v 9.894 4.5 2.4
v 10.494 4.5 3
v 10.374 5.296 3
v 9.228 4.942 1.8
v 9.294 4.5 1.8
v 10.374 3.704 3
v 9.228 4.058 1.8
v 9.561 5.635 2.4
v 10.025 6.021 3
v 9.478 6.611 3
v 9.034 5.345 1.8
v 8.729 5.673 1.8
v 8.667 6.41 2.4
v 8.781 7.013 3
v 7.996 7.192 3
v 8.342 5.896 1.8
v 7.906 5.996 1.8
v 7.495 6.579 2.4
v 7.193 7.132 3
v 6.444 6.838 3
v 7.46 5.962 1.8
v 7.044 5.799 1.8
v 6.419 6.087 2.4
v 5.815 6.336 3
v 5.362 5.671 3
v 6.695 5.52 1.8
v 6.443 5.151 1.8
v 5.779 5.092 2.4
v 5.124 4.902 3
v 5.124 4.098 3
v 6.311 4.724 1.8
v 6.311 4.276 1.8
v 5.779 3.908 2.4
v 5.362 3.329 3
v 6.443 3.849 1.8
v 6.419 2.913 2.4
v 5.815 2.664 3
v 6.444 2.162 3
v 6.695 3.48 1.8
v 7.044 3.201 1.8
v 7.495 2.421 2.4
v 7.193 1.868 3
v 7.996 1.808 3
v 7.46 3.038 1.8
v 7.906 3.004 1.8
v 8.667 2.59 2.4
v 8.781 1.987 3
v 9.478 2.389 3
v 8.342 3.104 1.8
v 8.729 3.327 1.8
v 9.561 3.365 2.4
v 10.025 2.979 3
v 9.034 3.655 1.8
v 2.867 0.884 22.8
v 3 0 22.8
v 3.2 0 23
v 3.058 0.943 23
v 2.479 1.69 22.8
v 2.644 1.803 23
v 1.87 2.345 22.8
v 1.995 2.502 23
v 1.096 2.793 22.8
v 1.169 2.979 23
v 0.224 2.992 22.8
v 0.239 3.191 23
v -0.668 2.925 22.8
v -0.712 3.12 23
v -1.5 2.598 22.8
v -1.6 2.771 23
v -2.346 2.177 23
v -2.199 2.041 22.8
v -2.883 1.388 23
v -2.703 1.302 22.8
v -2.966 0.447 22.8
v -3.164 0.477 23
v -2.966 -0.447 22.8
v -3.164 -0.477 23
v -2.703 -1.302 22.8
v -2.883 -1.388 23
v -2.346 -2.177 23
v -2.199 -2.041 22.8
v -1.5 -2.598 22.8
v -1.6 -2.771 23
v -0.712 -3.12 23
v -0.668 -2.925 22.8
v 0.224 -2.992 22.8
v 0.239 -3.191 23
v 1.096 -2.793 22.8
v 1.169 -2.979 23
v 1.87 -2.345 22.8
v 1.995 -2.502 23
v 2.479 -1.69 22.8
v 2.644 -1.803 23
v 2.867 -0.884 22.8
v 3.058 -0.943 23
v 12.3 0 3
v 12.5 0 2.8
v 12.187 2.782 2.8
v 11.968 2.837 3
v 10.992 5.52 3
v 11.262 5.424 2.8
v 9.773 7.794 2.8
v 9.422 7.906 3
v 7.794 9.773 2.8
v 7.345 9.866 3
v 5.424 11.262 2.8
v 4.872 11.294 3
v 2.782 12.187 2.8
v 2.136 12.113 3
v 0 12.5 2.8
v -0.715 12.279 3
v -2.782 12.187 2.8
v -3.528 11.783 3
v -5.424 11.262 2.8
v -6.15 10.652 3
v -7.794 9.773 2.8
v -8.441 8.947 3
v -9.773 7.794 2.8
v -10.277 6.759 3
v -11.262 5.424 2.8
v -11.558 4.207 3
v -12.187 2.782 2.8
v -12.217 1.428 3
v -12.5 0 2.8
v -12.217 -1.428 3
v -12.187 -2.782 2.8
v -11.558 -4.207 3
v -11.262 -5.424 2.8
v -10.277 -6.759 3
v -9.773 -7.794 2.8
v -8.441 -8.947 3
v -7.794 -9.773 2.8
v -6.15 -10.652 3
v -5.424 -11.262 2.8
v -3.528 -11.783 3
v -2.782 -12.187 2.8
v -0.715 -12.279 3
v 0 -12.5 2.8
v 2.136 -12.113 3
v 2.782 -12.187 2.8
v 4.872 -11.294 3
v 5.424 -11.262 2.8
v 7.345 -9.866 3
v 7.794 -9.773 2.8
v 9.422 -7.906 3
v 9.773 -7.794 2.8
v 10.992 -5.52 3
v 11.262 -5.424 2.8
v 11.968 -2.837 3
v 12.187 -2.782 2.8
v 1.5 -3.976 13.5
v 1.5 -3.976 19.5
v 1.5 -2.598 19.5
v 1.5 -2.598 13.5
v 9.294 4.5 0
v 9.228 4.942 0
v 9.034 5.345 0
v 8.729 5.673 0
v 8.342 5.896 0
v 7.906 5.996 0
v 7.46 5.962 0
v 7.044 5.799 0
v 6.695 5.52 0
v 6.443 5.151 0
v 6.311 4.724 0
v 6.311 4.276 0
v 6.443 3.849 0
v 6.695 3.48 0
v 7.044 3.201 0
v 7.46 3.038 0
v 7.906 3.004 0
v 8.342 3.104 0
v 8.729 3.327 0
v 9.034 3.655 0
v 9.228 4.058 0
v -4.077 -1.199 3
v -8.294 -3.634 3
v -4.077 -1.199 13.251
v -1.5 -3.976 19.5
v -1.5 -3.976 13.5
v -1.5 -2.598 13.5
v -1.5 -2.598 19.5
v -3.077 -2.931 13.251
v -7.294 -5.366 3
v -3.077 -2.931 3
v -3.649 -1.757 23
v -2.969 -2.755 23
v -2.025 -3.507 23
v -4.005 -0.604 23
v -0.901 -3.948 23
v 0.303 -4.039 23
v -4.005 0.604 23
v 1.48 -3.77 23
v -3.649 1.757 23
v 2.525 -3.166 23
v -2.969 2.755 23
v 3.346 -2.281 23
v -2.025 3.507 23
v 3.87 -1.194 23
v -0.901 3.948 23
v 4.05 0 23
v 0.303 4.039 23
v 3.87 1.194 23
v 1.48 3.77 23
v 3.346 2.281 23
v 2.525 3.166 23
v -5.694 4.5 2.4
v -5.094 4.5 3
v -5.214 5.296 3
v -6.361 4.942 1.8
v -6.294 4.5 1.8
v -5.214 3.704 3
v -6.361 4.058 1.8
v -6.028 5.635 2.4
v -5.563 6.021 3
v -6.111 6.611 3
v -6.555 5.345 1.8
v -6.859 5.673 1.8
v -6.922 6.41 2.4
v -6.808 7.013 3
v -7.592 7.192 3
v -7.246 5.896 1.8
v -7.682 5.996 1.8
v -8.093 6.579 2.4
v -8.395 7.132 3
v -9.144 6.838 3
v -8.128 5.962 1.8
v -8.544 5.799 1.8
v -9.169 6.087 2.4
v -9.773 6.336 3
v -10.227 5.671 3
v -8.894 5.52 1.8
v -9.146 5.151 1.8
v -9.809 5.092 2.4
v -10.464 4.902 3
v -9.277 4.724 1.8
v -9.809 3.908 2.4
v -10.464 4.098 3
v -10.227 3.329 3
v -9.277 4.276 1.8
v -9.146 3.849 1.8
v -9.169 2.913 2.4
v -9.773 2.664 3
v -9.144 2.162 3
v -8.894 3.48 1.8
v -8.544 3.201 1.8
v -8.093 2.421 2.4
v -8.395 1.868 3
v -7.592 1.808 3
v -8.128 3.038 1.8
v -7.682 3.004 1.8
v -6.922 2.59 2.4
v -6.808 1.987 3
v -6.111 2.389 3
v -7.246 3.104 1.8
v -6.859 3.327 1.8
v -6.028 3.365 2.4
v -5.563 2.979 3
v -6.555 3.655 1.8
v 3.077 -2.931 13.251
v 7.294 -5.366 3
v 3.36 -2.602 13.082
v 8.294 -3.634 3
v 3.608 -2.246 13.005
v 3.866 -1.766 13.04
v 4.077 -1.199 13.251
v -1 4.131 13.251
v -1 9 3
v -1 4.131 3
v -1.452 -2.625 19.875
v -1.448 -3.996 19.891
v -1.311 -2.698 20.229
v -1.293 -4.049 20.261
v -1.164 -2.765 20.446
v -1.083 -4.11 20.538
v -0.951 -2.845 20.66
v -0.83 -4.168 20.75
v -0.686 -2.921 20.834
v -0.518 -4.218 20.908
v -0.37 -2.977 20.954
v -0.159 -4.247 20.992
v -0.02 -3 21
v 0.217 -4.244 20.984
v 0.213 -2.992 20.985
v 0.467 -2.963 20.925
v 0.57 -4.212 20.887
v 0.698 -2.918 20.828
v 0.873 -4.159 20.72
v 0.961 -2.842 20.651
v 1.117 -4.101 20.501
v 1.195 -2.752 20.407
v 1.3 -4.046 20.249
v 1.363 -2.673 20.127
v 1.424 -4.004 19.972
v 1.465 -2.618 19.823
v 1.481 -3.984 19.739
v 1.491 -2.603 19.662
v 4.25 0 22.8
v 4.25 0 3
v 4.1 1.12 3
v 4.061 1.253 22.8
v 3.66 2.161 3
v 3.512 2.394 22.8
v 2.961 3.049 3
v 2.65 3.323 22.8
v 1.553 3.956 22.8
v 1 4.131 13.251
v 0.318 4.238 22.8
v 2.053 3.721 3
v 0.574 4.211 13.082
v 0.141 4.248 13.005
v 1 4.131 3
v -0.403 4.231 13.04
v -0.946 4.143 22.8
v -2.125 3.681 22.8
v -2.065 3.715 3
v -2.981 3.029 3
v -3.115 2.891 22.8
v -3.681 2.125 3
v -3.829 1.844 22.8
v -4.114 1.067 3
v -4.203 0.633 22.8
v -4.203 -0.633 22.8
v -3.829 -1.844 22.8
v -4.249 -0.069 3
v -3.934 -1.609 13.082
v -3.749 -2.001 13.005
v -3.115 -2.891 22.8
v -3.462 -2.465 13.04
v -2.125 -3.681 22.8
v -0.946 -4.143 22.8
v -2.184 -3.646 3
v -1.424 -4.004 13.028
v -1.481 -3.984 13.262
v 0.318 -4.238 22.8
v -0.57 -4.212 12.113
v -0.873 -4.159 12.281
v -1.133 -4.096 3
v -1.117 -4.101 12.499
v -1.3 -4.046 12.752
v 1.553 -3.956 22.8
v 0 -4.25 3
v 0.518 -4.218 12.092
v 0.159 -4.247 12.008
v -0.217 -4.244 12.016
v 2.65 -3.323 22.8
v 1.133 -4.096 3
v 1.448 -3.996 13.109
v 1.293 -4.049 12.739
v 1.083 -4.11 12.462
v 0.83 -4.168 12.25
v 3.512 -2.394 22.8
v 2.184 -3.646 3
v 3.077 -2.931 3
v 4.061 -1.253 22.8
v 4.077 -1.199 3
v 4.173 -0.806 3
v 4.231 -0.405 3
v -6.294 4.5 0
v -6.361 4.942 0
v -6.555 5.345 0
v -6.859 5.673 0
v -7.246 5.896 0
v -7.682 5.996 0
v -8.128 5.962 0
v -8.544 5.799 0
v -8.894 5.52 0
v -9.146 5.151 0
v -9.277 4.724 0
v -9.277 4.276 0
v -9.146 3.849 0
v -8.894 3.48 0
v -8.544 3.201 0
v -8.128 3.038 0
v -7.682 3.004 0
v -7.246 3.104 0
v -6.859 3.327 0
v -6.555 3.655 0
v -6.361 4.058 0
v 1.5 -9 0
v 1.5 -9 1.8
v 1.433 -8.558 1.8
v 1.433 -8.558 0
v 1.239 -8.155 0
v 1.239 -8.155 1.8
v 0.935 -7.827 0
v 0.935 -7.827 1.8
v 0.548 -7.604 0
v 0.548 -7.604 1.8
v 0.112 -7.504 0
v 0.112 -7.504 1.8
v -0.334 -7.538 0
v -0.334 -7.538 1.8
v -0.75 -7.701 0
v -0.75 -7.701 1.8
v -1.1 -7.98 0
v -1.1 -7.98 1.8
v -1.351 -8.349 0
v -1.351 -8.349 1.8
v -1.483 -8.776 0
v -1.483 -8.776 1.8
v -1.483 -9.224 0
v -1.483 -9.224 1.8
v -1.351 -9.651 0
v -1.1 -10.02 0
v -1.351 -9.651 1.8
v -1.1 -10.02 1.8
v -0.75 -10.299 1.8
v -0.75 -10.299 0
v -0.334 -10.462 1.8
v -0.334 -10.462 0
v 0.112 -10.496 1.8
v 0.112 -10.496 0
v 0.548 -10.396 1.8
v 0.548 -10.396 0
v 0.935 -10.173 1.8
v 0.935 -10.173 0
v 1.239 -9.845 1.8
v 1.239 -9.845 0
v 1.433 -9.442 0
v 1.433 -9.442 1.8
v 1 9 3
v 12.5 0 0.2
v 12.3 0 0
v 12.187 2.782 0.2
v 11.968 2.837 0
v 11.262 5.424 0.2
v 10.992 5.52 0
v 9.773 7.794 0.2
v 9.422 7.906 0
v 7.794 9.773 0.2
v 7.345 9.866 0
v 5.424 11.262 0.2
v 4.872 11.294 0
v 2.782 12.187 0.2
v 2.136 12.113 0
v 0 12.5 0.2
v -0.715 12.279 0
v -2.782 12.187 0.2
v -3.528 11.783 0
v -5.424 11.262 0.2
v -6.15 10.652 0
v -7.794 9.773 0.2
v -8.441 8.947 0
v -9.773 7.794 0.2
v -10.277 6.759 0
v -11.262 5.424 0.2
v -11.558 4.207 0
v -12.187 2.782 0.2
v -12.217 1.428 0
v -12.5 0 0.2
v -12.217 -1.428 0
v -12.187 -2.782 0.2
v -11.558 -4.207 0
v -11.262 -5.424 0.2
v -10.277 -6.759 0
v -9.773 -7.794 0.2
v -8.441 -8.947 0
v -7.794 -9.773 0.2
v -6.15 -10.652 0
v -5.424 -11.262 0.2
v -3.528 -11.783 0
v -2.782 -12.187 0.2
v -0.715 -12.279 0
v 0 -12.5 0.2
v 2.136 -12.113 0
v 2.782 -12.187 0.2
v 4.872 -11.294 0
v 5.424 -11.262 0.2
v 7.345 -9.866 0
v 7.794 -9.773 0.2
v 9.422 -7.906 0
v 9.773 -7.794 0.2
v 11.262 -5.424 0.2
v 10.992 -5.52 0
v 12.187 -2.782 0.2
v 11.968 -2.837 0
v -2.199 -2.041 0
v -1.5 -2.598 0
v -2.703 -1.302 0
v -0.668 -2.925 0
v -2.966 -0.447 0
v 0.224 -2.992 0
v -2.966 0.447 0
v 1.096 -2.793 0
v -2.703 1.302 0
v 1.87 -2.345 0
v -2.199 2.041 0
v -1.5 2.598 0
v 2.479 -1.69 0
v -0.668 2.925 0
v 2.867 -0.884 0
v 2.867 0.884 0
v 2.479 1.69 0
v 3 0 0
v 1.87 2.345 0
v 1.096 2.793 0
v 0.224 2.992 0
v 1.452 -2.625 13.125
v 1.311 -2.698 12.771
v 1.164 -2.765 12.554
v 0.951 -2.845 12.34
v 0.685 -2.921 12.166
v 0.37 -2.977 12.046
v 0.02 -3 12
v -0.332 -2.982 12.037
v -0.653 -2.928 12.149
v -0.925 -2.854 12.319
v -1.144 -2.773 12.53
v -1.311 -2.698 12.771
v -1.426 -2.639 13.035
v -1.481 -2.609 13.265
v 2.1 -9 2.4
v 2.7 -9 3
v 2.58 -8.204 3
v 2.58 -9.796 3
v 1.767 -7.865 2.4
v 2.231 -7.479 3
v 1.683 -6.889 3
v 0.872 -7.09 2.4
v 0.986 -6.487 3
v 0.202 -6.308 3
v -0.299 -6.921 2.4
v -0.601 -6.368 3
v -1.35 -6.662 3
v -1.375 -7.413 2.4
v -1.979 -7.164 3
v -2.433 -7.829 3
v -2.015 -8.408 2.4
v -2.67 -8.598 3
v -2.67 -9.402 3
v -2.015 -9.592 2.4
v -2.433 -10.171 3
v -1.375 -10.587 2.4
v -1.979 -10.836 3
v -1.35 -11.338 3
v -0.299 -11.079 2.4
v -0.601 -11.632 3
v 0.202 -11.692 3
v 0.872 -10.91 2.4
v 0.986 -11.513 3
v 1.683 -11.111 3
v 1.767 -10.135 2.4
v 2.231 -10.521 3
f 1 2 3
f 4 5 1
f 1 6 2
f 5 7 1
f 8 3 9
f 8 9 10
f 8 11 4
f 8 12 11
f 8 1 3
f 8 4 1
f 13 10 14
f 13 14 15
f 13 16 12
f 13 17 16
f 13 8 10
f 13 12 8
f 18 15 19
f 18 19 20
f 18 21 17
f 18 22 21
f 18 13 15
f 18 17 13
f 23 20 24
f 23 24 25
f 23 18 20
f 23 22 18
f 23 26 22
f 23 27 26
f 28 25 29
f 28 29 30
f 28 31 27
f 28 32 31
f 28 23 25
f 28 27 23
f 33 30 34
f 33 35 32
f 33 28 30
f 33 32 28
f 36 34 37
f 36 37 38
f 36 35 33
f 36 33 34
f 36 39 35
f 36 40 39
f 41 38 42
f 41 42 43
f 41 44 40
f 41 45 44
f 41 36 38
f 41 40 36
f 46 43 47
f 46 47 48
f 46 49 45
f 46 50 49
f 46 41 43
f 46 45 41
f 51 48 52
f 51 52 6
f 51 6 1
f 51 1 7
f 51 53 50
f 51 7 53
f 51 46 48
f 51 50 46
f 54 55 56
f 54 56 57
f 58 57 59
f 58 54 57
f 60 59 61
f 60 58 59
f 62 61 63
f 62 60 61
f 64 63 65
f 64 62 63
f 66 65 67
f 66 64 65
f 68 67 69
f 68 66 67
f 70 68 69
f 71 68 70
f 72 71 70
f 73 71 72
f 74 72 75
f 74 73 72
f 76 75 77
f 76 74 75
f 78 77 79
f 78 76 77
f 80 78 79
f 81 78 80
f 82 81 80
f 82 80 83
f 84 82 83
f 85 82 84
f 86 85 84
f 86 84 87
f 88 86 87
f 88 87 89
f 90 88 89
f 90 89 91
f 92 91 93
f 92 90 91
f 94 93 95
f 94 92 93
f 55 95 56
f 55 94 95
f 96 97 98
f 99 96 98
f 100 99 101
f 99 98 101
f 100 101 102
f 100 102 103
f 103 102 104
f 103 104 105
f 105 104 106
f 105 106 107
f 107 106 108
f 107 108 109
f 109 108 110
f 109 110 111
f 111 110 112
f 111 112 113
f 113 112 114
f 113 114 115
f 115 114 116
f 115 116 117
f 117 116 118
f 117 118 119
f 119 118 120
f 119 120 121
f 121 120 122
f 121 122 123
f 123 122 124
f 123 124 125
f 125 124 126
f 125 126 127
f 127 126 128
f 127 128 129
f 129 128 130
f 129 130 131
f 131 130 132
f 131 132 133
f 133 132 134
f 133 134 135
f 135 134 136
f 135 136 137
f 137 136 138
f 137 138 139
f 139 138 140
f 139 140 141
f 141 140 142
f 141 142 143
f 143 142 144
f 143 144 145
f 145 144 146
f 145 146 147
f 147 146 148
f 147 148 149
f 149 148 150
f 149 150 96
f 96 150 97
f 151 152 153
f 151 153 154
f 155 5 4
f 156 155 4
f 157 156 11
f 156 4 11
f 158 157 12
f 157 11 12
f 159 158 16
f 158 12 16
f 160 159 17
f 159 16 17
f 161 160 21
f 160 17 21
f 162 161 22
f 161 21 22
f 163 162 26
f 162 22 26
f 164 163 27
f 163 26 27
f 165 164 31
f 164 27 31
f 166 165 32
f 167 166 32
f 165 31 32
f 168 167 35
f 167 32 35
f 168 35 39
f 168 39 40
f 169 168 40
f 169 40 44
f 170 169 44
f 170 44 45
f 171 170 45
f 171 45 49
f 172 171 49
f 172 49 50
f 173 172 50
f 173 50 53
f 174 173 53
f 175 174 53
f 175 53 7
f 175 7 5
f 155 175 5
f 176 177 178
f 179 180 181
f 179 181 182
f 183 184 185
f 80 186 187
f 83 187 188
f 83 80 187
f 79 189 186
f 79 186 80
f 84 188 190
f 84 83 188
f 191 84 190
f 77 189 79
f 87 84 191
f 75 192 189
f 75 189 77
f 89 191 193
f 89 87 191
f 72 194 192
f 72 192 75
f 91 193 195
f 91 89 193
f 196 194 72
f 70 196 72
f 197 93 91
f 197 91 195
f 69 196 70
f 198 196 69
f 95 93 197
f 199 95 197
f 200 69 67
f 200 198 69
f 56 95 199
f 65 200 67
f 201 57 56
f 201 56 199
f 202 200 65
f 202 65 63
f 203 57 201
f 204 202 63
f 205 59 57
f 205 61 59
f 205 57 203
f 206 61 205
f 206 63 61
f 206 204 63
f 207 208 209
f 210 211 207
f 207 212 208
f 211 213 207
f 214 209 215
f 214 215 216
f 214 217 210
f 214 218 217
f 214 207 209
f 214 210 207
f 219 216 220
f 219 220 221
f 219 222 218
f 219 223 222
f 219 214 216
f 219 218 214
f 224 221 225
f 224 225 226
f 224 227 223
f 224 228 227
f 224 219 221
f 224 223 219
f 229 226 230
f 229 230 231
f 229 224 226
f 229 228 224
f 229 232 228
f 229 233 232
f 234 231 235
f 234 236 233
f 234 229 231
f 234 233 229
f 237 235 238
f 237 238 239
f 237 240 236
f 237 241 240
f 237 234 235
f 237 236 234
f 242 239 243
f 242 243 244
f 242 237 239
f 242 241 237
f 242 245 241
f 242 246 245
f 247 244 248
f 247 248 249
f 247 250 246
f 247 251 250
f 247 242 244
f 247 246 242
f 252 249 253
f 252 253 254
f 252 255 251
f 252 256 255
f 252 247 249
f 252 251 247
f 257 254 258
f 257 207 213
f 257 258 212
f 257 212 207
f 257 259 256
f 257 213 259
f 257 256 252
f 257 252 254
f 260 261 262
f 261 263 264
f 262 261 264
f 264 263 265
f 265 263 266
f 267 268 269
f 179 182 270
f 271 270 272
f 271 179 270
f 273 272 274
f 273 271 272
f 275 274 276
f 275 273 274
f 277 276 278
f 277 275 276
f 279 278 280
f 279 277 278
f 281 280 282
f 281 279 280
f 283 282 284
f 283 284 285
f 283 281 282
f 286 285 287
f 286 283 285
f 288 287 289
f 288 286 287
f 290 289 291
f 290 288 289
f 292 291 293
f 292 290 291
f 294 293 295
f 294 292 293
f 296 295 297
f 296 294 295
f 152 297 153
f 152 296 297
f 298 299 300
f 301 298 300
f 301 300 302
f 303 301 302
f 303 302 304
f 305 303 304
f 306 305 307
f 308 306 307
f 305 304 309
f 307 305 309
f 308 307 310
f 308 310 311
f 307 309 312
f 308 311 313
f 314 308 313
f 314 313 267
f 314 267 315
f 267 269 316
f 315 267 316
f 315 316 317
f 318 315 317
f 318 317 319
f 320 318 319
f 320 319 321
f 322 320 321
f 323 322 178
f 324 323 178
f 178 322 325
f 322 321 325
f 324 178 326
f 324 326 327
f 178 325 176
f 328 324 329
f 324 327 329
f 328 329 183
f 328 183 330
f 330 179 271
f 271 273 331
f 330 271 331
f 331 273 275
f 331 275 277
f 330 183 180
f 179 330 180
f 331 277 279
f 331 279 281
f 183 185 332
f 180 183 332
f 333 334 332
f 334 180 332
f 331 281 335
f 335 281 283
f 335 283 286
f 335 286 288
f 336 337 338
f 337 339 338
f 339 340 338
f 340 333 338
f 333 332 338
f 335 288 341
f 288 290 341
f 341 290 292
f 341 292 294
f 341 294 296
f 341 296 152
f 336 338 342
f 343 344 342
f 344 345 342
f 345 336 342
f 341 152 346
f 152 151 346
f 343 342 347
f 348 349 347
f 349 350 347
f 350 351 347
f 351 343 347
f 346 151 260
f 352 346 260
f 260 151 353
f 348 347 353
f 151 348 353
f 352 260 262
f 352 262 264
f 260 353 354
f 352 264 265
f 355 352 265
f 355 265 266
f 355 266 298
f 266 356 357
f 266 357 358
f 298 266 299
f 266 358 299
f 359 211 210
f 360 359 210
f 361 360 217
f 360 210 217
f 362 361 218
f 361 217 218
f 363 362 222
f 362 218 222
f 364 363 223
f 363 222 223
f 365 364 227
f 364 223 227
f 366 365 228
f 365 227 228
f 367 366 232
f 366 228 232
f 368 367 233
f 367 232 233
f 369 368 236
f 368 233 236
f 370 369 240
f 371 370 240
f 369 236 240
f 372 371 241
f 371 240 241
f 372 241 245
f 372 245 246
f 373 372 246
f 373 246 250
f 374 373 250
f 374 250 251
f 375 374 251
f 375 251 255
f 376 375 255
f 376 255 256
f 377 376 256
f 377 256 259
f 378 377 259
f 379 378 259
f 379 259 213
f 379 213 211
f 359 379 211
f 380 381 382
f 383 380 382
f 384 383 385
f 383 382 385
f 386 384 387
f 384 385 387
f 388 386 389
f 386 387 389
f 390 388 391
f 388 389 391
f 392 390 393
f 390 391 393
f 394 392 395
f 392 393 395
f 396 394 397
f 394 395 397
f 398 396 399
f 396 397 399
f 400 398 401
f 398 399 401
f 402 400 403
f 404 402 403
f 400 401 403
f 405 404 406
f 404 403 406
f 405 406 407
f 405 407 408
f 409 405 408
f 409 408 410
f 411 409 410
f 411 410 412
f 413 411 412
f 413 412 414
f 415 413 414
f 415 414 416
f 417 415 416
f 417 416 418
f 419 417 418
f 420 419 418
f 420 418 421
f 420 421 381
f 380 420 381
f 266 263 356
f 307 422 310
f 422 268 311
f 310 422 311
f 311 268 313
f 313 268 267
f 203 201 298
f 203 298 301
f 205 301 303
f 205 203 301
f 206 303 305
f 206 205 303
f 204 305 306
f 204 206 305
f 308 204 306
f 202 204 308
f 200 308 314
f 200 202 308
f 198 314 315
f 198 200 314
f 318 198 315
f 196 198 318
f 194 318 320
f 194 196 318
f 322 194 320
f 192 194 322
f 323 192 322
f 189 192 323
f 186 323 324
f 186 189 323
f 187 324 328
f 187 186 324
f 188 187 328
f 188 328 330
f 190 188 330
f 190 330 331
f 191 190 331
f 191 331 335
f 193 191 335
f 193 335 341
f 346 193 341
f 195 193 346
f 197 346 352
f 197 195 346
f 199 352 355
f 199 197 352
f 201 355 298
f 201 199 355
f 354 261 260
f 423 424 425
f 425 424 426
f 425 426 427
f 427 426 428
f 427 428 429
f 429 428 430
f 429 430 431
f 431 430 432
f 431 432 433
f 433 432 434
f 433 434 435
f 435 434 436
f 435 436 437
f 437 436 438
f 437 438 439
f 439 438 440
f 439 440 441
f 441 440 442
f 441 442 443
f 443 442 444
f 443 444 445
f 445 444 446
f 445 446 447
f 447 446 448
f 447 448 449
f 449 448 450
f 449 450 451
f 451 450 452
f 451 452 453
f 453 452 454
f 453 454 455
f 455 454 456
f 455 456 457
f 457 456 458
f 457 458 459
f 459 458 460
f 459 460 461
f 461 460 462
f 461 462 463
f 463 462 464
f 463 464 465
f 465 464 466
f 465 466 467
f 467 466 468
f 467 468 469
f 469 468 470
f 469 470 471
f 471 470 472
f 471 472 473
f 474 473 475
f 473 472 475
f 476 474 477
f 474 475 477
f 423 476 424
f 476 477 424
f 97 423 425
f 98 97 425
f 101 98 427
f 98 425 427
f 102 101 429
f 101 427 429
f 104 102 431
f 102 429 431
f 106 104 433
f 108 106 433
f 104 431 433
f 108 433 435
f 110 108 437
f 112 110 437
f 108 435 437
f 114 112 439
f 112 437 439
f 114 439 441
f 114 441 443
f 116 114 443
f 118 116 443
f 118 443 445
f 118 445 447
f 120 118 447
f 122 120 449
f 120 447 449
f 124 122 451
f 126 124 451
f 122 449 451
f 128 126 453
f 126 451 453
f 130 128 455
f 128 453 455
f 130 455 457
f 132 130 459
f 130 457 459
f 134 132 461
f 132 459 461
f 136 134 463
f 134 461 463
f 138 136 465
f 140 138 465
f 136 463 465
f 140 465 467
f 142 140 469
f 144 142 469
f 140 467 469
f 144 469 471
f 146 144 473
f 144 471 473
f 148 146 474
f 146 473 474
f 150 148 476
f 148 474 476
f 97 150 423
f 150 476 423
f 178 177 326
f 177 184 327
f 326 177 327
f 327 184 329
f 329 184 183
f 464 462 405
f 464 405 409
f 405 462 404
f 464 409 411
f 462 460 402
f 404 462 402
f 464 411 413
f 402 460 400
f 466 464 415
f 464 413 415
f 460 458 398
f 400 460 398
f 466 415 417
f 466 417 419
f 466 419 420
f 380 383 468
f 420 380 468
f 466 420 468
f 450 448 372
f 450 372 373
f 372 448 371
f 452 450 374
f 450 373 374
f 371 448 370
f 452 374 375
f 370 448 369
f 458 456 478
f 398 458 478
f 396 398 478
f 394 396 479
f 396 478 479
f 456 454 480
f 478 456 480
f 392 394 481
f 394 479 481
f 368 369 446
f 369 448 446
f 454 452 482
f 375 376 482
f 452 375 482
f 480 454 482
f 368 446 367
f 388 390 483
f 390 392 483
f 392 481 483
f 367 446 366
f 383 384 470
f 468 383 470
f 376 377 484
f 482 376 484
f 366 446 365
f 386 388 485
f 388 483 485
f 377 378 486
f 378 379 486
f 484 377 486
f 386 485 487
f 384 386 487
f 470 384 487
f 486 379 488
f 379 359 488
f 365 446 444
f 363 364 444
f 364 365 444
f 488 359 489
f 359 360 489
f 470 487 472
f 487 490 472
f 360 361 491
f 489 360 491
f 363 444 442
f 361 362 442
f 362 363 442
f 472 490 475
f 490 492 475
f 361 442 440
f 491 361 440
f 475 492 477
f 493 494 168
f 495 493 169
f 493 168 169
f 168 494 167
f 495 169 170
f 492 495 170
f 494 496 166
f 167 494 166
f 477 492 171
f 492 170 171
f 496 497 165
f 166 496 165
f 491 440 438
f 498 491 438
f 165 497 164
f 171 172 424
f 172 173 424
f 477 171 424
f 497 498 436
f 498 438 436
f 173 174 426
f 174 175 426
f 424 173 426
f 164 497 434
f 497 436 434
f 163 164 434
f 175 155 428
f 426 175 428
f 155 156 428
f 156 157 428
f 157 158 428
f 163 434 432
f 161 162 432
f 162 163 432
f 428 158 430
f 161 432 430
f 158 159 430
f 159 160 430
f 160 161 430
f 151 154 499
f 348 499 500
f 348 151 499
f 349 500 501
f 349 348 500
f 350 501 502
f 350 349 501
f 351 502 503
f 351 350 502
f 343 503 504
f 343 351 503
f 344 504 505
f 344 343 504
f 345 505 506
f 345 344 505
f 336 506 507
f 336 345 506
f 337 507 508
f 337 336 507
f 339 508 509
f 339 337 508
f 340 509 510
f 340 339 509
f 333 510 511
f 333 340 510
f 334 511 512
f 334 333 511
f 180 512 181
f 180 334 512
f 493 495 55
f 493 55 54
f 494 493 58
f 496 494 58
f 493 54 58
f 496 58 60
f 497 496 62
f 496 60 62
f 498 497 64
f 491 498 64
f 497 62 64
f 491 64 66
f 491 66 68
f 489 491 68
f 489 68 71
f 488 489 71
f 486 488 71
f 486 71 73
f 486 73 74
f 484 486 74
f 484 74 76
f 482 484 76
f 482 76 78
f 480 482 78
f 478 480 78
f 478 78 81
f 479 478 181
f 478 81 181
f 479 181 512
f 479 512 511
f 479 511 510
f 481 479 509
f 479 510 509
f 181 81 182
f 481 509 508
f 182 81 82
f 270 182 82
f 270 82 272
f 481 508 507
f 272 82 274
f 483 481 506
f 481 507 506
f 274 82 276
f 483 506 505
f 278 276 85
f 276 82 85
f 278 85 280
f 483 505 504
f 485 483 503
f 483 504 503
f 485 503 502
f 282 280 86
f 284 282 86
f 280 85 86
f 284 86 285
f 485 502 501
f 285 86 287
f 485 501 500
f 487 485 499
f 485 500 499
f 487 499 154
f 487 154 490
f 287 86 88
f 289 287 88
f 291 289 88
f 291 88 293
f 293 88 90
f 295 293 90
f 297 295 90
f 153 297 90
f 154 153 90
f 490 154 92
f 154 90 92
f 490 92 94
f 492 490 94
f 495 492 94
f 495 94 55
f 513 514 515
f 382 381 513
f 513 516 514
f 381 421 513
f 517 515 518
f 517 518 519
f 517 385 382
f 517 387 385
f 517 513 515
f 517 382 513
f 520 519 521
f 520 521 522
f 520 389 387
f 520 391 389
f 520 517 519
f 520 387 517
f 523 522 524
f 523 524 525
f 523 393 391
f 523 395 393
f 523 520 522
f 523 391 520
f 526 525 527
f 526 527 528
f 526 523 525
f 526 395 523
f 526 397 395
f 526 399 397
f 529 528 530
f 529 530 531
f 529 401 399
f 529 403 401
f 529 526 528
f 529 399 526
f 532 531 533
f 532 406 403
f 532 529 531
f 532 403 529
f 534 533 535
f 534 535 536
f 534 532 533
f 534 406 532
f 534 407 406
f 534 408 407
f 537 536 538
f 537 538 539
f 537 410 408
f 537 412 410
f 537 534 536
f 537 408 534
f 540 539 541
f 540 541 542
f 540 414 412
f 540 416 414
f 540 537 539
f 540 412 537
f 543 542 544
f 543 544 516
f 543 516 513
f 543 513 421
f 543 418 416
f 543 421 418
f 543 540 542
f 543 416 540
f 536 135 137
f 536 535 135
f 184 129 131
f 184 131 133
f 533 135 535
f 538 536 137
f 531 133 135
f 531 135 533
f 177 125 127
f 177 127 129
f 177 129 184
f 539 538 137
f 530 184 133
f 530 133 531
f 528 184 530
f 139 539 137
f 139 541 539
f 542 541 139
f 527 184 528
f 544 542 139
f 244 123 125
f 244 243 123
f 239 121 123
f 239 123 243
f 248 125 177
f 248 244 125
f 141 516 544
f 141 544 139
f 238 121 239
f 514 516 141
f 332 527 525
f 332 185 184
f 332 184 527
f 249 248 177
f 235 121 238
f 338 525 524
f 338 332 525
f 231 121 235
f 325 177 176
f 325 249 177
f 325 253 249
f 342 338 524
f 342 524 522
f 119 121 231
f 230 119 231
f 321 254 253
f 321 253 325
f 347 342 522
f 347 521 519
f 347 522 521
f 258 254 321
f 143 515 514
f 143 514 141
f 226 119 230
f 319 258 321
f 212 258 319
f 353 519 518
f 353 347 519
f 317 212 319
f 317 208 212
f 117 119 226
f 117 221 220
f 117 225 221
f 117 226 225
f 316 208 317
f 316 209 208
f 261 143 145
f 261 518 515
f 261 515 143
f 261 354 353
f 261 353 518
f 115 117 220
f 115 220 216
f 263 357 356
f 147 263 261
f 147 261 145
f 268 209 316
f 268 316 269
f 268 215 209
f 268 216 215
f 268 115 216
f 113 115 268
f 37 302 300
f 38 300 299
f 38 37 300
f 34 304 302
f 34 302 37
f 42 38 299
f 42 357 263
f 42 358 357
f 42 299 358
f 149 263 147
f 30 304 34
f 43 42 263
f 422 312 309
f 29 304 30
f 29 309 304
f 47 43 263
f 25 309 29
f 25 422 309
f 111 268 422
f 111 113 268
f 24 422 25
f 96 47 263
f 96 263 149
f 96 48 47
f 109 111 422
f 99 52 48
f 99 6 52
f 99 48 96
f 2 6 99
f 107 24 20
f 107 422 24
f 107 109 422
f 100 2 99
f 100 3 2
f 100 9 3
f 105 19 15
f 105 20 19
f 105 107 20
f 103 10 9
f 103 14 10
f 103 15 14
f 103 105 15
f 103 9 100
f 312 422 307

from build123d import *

# Parameters (mm, degrees)
SKETCH1_R               = 12.5
BOSS_EXTRUDE1_DEPTH     = 3
SKETCH2_R               = 4.25
SKETCH2_R_2             = 3
BOSS_EXTRUDE2_DEPTH     = 20
CUT_EXTRUDE2_REACH      = 28.693
SKETCH7_R               = 1.5
CHAMFER3_SIZE           = 1.2
CUT_EXTRUDE4_REACH      = 33.078
CUT_EXTRUDE4_END_RADIUS = 3
CUT_EXTRUDE5_REACH      = 28.693
SKETCH10_R              = 3
RIB3_REACH              = 31.009
SKETCH13_WALL_W         = 71.088033888
SKETCH13_WALL_H         = 2
CIRPATTERN3_COUNT       = 3
CHAMFER8_SIZE           = 0.2


with BuildPart() as part:
    # Sketch1 → Boss-Extrude1 (new body)
    with BuildSketch(Plane.XY):
        Circle(SKETCH1_R)
    extrude(amount=BOSS_EXTRUDE1_DEPTH)

    # Sketch2 → Boss-Extrude2 (add)
    with BuildSketch(Plane.XY.offset(3)):
        Circle(SKETCH2_R)
        Circle(SKETCH2_R_2, mode=Mode.SUBTRACT)
    extrude(amount=BOSS_EXTRUDE2_DEPTH)

    # Sketch7 → Cut-Extrude2 (cut, up to next)
    with BuildSketch(Plane.XY.offset(3), mode=Mode.PRIVATE) as cut_extrude2_sk1:
        with Locations((7.794228634, 4.5)):
            Circle(SKETCH7_R)
    cut_extrude2_tool1 = extrude(cut_extrude2_sk1.sketch, amount=-CUT_EXTRUDE2_REACH, mode=Mode.PRIVATE) & part.part
    # Sketch7 → Cut-Extrude2 (cut, up to next)
    with BuildSketch(Plane.XY.offset(3), mode=Mode.PRIVATE) as cut_extrude2_sk2:
        with Locations((0, -9)):
            Circle(SKETCH7_R)
    cut_extrude2_tool2 = extrude(cut_extrude2_sk2.sketch, amount=-CUT_EXTRUDE2_REACH, mode=Mode.PRIVATE) & part.part
    # Sketch7 → Cut-Extrude2 (cut, up to next)
    with BuildSketch(Plane.XY.offset(3), mode=Mode.PRIVATE) as cut_extrude2_sk3:
        with Locations((-7.794228634, 4.5)):
            Circle(SKETCH7_R)
    cut_extrude2_tool3 = extrude(cut_extrude2_sk3.sketch, amount=-CUT_EXTRUDE2_REACH, mode=Mode.PRIVATE) & part.part
    add(cut_extrude2_tool1.solids().sort_by_distance((7.794229, 4.5, 3))[0], mode=Mode.SUBTRACT)
    add(cut_extrude2_tool2.solids().sort_by_distance((0, -9, 3))[0], mode=Mode.SUBTRACT)
    add(cut_extrude2_tool3.solids().sort_by_distance((-7.794229, 4.5, 3))[0], mode=Mode.SUBTRACT)

    # Chamfer3
    chamfer3_edges = [part.edges().sort_by_distance(p)[0] for p in [
        (6.294228634, 4.5, 3),
        (-1.5, -9, 3),
        (-9.294228634, 4.5, 3),
    ]]
    chamfer(chamfer3_edges, length=CHAMFER3_SIZE)

    # Cut-Extrude4: up to this cylinder (the profile starts outside it)
    cut_extrude4_end = Plane(origin=(0, 0, 16.5), z_dir=(0, 0, -1)) * Cylinder(CUT_EXTRUDE4_END_RADIUS, 73.156, mode=Mode.PRIVATE)
    # Sketch9 → Cut-Extrude4 (cut, up to the surface)
    with BuildSketch(Plane(origin=(0, -4.25, 0), x_dir=(1, 0, 0), z_dir=(0, 1, 0)), mode=Mode.PRIVATE) as cut_extrude4_sk1:
        with BuildLine():
            Line((-1.5, -13.5), (-1.5, -19.5))
            ThreePointArc((-1.5, -19.5), (0, -21), (1.5, -19.5))
            Line((1.5, -19.5), (1.5, -13.5))
            ThreePointArc((1.5, -13.5), (0, -12), (-1.5, -13.5))
        make_face()
    cut_extrude4_tool1 = extrude(cut_extrude4_sk1.sketch, amount=CUT_EXTRUDE4_REACH, mode=Mode.PRIVATE) - cut_extrude4_end
    add(cut_extrude4_tool1.solids().sort_by_distance((0, -4.25, 16.5))[0], mode=Mode.SUBTRACT)

    # Sketch10 → Cut-Extrude5 (cut, up to next)
    with BuildSketch(Plane.XY.offset(3), mode=Mode.PRIVATE) as cut_extrude5_sk1:
        Circle(SKETCH10_R)
    cut_extrude5_tool1 = extrude(cut_extrude5_sk1.sketch, amount=-CUT_EXTRUDE5_REACH, mode=Mode.PRIVATE) & part.part
    add(cut_extrude5_tool1.solids().sort_by_distance((0, 0, 3))[0], mode=Mode.SUBTRACT)

    # Sketch13 wall → Rib3 (add, up to next)
    with BuildSketch(Plane(origin=(0, 6.625, 8), x_dir=(0, -0.429056814568, 0.903277504354), z_dir=(0, -0.903277504354, -0.429056814568)), mode=Mode.PRIVATE) as rib3_sk1:
        Rectangle(SKETCH13_WALL_W, SKETCH13_WALL_H)
    rib3_tool1 = extrude(rib3_sk1.sketch, amount=RIB3_REACH, mode=Mode.PRIVATE) - part.part
    rib3 = rib3_tool1.solids().sort_by_distance((0, 6.625, 8))[0]
    add(rib3)

    # CirPattern3: Rib3 ×3 about axis
    cirpattern3_axis = Axis((0, 0, 0), (0, 0, 1))
    for i in range(1, CIRPATTERN3_COUNT):
        add(rib3.rotate(cirpattern3_axis, i * 360 / CIRPATTERN3_COUNT))

    # Chamfer8
    chamfer8_edges = [part.edges().sort_by_distance(p)[0] for p in [
        (-12.5, 0, 0),
        (-12.5, 0, 3),
        (-4.25, 0, 23),
        (-3, 0, 23),
    ]]
    chamfer(chamfer8_edges, length=CHAMFER8_SIZE)


solid = part.part
